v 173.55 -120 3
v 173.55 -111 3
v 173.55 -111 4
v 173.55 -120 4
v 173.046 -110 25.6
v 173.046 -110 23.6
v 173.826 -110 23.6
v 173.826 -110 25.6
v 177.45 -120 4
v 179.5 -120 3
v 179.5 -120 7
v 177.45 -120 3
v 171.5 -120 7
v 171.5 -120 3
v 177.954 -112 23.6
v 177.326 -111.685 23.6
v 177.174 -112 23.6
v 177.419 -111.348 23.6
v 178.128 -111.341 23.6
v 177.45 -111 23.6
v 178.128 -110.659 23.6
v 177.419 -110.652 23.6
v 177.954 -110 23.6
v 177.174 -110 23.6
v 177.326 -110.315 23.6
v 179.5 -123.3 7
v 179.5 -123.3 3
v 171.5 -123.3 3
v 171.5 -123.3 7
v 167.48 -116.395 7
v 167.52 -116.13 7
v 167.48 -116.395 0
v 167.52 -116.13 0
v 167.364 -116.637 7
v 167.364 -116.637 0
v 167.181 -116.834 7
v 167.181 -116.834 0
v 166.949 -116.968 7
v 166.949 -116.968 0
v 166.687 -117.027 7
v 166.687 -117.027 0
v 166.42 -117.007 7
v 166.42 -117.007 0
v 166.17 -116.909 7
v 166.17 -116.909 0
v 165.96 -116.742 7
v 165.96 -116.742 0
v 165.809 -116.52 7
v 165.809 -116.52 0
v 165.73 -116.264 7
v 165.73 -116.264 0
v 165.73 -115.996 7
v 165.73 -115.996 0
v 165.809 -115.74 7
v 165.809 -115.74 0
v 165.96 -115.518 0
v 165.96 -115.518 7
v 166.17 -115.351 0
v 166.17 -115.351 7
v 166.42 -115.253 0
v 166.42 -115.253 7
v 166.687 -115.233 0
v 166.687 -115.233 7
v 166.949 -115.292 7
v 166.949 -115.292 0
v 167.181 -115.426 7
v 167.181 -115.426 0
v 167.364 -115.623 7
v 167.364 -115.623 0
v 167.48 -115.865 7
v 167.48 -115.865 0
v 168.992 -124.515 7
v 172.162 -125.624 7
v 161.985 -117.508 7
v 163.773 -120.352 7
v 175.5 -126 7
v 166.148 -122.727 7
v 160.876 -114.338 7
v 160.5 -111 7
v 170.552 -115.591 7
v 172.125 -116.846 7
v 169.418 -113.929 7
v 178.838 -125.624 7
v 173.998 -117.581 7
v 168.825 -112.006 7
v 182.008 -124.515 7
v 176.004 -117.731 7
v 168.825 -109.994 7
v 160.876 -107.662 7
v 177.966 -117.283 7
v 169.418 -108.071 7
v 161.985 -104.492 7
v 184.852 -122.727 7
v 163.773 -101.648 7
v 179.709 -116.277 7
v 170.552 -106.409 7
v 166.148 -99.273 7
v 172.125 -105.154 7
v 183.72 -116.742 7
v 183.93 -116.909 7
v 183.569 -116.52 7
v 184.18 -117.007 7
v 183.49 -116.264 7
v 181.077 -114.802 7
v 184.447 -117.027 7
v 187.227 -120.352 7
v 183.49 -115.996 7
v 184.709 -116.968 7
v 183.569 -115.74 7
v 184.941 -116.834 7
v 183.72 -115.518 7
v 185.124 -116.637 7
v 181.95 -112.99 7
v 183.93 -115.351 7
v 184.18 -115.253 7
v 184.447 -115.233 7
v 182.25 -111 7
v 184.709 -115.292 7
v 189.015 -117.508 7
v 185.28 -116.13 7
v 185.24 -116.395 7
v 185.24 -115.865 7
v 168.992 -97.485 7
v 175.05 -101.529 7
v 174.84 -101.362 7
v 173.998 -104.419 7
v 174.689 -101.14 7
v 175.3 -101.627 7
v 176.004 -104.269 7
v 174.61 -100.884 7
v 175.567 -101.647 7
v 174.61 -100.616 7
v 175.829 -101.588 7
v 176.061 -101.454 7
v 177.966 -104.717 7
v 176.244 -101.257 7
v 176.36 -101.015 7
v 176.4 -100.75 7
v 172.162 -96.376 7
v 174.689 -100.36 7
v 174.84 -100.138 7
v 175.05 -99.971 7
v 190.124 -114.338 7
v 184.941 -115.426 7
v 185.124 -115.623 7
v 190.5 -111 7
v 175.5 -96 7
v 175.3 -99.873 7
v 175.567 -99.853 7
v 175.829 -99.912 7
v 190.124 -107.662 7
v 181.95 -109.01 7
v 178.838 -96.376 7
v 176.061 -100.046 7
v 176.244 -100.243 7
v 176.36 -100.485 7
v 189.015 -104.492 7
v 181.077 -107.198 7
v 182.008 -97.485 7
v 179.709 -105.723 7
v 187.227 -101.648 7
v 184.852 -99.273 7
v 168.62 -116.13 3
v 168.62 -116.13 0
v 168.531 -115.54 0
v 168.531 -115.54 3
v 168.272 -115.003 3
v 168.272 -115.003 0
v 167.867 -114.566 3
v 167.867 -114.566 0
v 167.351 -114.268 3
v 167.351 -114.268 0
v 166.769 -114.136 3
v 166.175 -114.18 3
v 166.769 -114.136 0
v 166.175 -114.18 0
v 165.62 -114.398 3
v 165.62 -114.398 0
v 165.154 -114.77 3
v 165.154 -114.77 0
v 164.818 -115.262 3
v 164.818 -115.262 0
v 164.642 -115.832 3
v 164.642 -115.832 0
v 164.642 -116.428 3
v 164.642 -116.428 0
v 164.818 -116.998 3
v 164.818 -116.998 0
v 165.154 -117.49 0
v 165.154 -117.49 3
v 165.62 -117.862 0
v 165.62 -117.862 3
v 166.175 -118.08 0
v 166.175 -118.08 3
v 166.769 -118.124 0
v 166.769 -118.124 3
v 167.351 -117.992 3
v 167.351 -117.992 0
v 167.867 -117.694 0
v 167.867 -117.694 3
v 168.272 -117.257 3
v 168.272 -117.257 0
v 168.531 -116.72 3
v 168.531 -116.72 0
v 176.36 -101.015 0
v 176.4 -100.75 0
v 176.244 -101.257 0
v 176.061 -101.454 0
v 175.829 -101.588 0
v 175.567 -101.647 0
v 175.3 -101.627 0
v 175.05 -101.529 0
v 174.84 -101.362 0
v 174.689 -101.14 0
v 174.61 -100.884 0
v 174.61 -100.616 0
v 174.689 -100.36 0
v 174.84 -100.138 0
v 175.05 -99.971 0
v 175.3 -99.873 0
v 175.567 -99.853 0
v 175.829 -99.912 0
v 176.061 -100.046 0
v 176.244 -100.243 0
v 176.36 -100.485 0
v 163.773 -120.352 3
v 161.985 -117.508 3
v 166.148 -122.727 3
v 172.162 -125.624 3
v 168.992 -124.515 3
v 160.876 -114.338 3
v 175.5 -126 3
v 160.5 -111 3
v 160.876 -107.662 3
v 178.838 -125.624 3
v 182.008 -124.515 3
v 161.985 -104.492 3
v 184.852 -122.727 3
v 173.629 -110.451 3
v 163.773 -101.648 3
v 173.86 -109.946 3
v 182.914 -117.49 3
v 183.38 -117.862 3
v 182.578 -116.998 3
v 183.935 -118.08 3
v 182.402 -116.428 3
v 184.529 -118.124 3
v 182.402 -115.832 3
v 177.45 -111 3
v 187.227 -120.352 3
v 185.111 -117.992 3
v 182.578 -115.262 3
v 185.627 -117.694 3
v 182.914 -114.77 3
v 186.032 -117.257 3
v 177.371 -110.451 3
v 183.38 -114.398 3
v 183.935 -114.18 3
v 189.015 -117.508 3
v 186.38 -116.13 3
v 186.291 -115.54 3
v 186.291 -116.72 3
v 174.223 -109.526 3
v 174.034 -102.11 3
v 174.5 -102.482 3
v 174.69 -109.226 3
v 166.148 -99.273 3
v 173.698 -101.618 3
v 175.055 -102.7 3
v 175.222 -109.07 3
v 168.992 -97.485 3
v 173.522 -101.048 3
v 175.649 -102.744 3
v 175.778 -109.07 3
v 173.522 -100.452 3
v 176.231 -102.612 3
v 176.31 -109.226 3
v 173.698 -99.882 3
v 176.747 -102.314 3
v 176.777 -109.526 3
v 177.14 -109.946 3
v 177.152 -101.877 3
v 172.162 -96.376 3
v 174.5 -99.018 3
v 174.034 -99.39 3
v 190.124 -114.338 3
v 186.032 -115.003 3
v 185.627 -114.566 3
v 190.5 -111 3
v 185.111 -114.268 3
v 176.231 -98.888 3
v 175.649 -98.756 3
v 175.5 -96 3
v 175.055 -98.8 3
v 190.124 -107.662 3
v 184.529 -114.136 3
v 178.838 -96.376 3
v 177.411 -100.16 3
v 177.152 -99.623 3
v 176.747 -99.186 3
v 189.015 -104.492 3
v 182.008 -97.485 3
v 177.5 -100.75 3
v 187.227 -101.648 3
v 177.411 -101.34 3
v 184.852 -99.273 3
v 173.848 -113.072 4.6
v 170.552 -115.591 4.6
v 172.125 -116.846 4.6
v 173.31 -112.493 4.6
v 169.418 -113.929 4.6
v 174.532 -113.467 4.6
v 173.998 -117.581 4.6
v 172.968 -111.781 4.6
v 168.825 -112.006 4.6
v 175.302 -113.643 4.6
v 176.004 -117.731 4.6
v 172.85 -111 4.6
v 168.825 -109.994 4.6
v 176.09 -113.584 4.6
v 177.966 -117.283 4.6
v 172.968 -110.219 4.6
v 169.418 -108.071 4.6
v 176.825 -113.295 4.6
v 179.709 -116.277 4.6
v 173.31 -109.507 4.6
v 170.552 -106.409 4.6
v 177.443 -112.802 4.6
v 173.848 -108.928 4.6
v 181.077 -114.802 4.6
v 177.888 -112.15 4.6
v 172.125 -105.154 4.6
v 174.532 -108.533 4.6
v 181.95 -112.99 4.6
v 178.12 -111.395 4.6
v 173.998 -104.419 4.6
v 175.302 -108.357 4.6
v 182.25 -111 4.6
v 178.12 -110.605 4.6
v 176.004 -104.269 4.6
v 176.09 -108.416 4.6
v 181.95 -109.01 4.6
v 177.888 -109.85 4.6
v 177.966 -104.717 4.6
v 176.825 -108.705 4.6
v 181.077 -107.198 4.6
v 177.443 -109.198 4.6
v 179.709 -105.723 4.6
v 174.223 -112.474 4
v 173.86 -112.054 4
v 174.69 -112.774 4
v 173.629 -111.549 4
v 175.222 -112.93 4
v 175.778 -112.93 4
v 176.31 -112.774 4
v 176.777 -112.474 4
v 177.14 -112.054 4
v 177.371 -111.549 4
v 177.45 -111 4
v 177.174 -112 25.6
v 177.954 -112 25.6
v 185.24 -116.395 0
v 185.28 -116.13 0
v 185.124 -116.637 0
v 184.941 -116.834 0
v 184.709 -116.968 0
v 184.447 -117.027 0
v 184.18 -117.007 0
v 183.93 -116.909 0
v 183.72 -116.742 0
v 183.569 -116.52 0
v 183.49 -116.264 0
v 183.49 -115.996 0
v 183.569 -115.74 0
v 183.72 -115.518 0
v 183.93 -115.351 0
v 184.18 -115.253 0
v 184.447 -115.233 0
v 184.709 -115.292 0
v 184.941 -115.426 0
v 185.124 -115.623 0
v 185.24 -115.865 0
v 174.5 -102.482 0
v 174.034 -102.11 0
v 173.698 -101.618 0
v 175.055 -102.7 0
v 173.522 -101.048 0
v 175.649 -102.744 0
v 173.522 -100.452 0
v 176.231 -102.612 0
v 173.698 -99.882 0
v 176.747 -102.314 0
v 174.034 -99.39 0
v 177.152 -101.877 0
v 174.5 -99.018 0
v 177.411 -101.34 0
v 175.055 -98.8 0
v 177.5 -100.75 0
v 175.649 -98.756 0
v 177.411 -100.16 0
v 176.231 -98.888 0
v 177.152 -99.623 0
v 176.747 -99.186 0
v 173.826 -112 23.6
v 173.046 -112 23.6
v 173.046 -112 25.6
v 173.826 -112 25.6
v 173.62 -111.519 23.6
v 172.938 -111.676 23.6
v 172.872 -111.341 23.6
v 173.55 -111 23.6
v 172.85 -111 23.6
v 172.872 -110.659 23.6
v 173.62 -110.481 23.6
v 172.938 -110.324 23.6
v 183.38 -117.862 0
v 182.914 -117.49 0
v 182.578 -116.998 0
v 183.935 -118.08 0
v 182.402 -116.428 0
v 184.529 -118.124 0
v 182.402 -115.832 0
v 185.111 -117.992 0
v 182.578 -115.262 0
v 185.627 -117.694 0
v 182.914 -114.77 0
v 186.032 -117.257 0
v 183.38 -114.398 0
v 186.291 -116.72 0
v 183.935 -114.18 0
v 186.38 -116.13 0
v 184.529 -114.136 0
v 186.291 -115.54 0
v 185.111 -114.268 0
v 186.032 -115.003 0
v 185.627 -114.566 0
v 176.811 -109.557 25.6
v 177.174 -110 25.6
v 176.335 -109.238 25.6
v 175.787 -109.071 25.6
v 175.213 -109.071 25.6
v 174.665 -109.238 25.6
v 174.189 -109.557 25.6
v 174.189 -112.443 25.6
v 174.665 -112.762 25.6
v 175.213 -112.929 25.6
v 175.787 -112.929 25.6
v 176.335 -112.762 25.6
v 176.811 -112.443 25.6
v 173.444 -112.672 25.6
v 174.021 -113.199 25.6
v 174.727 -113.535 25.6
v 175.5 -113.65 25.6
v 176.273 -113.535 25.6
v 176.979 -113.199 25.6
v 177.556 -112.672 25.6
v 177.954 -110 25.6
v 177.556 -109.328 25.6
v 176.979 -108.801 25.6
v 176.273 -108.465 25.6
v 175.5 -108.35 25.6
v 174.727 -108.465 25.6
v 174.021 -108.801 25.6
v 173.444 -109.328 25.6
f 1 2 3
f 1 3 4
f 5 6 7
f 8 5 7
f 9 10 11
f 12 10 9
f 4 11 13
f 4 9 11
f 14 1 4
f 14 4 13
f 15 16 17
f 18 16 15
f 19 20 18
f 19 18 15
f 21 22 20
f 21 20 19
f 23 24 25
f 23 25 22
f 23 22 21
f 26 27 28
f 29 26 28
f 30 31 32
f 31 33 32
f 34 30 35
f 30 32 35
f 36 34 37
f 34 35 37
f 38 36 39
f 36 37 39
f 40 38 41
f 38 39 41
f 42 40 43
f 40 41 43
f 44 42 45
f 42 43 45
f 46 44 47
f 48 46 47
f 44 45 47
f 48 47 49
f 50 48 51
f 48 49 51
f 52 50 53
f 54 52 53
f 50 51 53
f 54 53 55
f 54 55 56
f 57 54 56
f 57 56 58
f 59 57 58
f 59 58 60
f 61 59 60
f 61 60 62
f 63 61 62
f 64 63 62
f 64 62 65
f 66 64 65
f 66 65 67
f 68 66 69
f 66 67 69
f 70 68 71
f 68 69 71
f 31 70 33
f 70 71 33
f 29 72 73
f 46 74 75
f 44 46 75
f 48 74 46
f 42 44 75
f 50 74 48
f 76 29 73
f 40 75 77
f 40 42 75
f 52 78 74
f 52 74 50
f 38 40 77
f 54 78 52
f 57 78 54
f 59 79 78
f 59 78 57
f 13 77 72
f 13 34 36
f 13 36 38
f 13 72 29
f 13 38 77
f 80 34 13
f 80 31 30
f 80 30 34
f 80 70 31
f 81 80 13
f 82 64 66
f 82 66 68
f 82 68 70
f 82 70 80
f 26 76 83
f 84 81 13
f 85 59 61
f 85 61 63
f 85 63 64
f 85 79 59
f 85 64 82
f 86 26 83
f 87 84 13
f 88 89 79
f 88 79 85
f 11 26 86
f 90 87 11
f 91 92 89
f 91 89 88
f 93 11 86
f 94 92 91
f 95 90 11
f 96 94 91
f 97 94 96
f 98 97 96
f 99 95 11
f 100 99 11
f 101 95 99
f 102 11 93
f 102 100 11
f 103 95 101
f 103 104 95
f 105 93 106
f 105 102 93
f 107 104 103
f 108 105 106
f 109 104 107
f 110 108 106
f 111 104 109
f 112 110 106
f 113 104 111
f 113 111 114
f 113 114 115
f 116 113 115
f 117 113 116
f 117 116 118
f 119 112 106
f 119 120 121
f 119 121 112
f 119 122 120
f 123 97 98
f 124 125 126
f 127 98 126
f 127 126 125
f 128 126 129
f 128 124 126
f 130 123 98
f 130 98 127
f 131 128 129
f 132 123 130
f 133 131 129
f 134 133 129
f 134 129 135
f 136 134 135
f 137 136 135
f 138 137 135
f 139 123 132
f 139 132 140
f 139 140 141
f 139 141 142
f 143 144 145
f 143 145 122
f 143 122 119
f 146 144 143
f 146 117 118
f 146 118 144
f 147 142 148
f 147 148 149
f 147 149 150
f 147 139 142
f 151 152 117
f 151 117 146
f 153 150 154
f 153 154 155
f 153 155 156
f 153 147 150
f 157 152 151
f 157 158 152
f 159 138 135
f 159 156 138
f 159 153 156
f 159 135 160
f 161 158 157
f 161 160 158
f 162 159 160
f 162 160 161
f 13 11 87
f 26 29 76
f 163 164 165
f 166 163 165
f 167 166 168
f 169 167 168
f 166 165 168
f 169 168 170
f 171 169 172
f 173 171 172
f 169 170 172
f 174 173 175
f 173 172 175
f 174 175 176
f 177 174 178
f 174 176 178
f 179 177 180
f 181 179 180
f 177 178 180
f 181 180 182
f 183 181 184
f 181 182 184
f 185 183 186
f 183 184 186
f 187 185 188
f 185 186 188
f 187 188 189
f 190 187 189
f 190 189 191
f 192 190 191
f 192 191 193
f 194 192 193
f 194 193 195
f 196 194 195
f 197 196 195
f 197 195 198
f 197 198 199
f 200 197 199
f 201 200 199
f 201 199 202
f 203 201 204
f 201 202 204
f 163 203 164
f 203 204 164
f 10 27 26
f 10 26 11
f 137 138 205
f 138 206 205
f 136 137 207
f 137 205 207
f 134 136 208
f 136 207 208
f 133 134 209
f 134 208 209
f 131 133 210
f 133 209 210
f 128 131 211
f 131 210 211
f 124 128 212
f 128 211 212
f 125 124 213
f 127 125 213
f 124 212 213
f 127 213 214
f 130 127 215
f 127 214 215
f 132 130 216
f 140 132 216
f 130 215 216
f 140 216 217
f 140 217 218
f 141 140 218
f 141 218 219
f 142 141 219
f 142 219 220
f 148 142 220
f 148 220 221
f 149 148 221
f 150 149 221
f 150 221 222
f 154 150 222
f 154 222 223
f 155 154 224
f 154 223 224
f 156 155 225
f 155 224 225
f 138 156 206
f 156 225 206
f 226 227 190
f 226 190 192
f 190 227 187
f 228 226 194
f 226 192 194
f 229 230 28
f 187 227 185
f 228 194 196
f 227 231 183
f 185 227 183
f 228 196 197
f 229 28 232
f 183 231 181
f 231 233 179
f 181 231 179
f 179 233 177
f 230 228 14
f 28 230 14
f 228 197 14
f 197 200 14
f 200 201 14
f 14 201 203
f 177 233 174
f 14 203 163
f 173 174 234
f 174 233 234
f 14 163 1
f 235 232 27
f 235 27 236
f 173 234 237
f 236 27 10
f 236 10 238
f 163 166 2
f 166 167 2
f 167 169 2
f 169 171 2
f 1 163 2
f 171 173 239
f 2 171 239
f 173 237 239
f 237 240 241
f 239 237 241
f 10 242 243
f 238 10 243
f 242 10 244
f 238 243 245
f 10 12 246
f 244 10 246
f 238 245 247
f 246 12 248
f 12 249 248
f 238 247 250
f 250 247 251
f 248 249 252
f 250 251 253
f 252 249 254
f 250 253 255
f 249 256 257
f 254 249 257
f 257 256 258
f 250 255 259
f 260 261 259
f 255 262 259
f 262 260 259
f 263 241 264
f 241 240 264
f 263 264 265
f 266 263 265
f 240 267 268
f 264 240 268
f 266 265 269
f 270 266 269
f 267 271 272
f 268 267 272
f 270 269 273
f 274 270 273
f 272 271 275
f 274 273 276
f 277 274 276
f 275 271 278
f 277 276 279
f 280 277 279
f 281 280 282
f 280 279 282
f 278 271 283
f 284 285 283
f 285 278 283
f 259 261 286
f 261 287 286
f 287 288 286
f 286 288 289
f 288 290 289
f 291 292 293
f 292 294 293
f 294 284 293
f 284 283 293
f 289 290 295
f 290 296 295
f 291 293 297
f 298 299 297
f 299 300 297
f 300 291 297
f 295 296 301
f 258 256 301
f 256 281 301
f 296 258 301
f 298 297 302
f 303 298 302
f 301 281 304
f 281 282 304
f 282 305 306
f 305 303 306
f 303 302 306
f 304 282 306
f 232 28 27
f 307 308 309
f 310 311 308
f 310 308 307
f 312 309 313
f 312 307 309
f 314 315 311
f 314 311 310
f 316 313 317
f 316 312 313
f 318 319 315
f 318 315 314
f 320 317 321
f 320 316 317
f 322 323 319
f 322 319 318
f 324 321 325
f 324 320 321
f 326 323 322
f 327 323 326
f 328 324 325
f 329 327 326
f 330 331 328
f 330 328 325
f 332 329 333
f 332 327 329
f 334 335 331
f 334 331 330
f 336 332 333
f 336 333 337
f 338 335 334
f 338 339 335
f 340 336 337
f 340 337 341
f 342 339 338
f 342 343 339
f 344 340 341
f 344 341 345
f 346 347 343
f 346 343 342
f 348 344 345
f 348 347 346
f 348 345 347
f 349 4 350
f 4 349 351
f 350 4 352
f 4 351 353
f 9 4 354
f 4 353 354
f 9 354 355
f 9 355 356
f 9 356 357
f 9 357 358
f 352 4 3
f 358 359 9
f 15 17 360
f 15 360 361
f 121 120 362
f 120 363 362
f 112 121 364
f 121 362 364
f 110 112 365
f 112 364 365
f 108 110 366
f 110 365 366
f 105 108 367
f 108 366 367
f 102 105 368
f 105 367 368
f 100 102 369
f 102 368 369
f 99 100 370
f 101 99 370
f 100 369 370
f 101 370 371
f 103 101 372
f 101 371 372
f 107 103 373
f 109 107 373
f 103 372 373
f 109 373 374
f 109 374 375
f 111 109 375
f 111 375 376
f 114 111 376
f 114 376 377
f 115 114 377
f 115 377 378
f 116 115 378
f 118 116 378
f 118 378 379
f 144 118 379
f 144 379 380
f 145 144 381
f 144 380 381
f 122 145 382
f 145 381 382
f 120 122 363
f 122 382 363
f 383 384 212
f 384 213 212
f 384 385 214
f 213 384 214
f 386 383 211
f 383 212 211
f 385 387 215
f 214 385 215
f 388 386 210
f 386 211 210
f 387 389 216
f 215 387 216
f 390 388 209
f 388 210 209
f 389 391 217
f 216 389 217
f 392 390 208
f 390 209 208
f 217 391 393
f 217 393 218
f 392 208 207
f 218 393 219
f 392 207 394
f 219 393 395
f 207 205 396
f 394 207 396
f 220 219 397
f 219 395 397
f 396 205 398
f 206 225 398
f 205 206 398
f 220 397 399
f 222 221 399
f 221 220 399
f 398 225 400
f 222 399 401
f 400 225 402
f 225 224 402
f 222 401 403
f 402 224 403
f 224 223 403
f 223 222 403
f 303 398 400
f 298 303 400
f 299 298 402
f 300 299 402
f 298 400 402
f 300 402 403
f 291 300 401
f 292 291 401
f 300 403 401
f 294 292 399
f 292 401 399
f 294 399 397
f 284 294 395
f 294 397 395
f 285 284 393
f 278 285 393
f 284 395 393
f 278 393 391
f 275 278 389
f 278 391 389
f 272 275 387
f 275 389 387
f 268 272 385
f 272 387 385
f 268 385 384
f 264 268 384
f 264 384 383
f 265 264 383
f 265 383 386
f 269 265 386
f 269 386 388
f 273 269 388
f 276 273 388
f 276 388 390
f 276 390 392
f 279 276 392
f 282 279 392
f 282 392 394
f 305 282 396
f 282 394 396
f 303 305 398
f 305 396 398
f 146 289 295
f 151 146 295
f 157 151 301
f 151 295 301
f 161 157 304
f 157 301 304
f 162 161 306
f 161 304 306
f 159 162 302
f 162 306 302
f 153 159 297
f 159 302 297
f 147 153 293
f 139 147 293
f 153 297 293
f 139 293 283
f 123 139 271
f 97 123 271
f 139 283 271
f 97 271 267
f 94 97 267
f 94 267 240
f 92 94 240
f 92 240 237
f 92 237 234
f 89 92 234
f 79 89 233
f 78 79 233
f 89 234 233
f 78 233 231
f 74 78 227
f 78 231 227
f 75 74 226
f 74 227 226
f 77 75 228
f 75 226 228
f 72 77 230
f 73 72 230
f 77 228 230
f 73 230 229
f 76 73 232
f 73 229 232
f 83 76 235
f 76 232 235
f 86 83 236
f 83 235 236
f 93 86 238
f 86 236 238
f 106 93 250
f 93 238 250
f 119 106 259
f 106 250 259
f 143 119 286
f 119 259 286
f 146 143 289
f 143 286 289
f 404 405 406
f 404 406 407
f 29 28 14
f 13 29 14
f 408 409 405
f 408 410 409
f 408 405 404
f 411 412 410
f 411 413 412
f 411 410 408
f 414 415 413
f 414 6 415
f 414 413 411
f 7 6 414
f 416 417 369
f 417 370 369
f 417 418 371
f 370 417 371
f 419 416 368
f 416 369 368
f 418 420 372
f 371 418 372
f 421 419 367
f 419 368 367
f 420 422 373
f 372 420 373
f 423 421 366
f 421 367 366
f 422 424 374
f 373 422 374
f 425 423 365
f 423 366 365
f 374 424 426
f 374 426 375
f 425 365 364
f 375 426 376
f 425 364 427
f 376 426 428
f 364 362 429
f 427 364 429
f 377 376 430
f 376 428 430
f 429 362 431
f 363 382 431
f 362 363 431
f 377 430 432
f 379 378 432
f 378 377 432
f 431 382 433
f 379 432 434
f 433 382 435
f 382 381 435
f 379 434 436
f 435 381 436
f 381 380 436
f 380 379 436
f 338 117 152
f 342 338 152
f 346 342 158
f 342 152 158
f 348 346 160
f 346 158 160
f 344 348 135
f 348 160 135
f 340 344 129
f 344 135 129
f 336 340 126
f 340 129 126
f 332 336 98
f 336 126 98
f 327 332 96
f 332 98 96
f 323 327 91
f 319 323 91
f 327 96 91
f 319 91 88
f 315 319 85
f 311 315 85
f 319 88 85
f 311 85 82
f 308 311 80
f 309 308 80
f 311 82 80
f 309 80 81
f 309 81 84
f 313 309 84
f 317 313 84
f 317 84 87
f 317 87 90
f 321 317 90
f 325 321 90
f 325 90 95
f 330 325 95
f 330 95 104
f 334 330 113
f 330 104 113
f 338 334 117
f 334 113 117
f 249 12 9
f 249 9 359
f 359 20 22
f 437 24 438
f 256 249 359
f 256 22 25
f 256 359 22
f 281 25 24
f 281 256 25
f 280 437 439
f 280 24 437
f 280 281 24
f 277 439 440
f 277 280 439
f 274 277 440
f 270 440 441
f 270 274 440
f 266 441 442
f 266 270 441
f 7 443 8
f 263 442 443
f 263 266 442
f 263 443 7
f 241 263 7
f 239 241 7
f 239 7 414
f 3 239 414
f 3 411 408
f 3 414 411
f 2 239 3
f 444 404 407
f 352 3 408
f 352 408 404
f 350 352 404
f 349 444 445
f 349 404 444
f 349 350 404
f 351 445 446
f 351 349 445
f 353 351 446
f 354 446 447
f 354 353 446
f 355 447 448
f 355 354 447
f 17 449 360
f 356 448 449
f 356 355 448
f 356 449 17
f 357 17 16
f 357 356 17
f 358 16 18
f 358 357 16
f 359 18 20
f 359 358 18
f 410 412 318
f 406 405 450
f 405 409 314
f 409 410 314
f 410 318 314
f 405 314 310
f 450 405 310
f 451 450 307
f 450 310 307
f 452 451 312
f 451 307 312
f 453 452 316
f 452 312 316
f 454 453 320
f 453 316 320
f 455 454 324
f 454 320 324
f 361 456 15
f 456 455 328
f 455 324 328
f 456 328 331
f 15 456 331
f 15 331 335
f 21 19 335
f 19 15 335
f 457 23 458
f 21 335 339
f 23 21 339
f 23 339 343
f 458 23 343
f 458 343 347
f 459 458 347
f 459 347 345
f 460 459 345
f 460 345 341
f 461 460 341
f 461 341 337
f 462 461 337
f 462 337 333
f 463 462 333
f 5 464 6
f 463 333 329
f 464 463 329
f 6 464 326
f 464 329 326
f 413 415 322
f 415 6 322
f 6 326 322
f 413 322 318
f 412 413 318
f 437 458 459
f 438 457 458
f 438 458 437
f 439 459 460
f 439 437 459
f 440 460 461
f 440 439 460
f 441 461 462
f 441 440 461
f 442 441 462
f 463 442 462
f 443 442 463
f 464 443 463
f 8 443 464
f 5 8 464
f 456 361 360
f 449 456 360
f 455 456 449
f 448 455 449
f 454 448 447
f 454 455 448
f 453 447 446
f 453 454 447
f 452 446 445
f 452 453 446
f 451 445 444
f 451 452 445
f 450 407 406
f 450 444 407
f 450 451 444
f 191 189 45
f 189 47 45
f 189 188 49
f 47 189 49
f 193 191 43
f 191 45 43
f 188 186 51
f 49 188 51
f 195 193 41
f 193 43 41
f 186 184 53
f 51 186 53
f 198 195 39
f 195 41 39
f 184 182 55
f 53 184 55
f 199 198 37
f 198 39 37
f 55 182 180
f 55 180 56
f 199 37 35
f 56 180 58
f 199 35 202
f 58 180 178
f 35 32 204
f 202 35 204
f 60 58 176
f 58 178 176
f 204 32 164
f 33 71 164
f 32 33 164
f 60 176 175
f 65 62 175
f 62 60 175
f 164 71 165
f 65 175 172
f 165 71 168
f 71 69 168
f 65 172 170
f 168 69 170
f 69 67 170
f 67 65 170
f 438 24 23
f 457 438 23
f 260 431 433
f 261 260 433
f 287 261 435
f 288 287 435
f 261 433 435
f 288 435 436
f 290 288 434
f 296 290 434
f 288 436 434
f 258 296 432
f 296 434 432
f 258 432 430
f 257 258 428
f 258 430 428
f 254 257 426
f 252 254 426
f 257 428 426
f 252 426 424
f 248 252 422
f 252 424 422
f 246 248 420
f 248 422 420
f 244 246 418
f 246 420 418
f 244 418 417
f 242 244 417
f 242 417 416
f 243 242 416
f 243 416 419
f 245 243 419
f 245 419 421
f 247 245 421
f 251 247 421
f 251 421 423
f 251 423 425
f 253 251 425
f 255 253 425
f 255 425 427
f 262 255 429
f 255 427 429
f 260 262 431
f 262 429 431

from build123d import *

# Parameters (mm, degrees)
SKETCH1_R             = 2
SKETCH1_R_2           = 0.9
BOSS_EXTRUDE1_DEPTH   = 3
BOSS_EXTRUDE1_2_DEPTH = 3
BOSS_EXTRUDE1_3_DEPTH = 3
SKETCH2_R             = 15
SKETCH2_R_2           = 1.95
BOSS_EXTRUDE2_DEPTH   = 4
SKETCH4_W             = 8
SKETCH4_H             = 3.3
CUT_EXTRUDE2_DEPTH    = 229.434345053
SKETCH5_R             = 6.75
CUT_EXTRUDE3_DEPTH    = 2.4
CUT_EXTRUDE5_DEPTH    = 1
SKETCH8_R             = 2.65
SKETCH8_R_2           = 1.95
BOSS_EXTRUDE3_DEPTH   = 21
SKETCH10_R            = 0.9
CUT_EXTRUDE6_DEPTH    = 230.514727196
SKETCH11_W            = 7
SKETCH11_H            = 2
CUT_EXTRUDE7_DEPTH    = 2


with BuildPart() as part:
    # Sketch1 → Boss-Extrude1 (new body)
    with BuildSketch(Plane.XY):
        with Locations((166.62, -116.13)):
            Circle(SKETCH1_R)
        with Locations((166.62, -116.13)):
            Circle(SKETCH1_R_2, mode=Mode.SUBTRACT)
    extrude(amount=BOSS_EXTRUDE1_DEPTH)



with BuildPart() as body_2:
    # Sketch1 → Boss-Extrude1 2 (new body)
    with BuildSketch(Plane.XY):
        with Locations((175.5, -100.75)):
            Circle(SKETCH1_R)
        with Locations((175.5, -100.75)):
            Circle(SKETCH1_R_2, mode=Mode.SUBTRACT)
    extrude(amount=BOSS_EXTRUDE1_2_DEPTH)


with BuildPart() as body_3:
    # Sketch1 → Boss-Extrude1 3 (new body)
    with BuildSketch(Plane.XY):
        with Locations((184.38, -116.13)):
            Circle(SKETCH1_R)
        with Locations((184.38, -116.13)):
            Circle(SKETCH1_R_2, mode=Mode.SUBTRACT)
    extrude(amount=BOSS_EXTRUDE1_3_DEPTH)


with BuildPart() as part_1:
    add(part.part)

    add(body_2.part)  # Boss-Extrude2 merges body 2

    add(body_3.part)  # Boss-Extrude2 merges body 3
    # Sketch2 → Boss-Extrude2 (add)
    with BuildSketch(Plane.XY.offset(3)):
        with Locations((175.5, -111)):
            Circle(SKETCH2_R)
        with Locations((175.5, -111)):
            Circle(SKETCH2_R_2, mode=Mode.SUBTRACT)
    extrude(amount=BOSS_EXTRUDE2_DEPTH)

    # Sketch4 → Cut-Extrude2 (cut, through all)
    with BuildSketch(Plane(origin=(0, 0, 3), x_dir=(-1, 0, 0), z_dir=(0, 0, -1))):
        with Locations((-175.5, -121.65)):
            Rectangle(SKETCH4_W, SKETCH4_H)
    extrude(amount=-CUT_EXTRUDE2_DEPTH, mode=Mode.SUBTRACT)

    # Sketch5 → Cut-Extrude3 (cut)
    with BuildSketch(Plane.XY.offset(7)):
        with Locations((175.5, -111)):
            Circle(SKETCH5_R)
    extrude(amount=-CUT_EXTRUDE3_DEPTH, mode=Mode.SUBTRACT)

    # Sketch6 → Cut-Extrude5 (cut)
    with BuildSketch(Plane(origin=(0, 0, 3), x_dir=(-1, 0, 0), z_dir=(0, 0, -1))):
        with BuildLine():
            Line((-173.55, -111), (-173.55, -120))
            ThreePointArc((-173.55, -120), (-175.5, -121.95), (-177.45, -120))
            Line((-177.45, -120), (-177.45, -111))
            ThreePointArc((-177.45, -111), (-175.5, -109.05), (-173.55, -111))
        make_face()
    extrude(amount=-CUT_EXTRUDE5_DEPTH, mode=Mode.SUBTRACT)

    # Sketch8 → Boss-Extrude3 (add)
    with BuildSketch(Plane.XY.offset(4.6)):
        with Locations(Location((175.5, -111, 0), (0, 0, 180))):
            Circle(SKETCH8_R)
        with Locations((175.5, -111)):
            Circle(SKETCH8_R_2, mode=Mode.SUBTRACT)
    extrude(amount=BOSS_EXTRUDE3_DEPTH)

    # Sketch10 → Cut-Extrude6 (cut, through all)
    with BuildSketch(Plane(origin=(0, 0, 3), x_dir=(-1, 0, 0), z_dir=(0, 0, -1))):
        with Locations(Location((-175.5, -100.75, 0), (0, 0, 180))):
            Circle(SKETCH10_R)
        with Locations(Location((-184.38, -116.13, 0), (0, 0, 180))):
            Circle(SKETCH10_R)
        with Locations(Location((-166.62, -116.13, 0), (0, 0, 180))):
            Circle(SKETCH10_R)
    extrude(amount=-CUT_EXTRUDE6_DEPTH, mode=Mode.SUBTRACT)

    # Sketch11 → Cut-Extrude7 (cut)
    with BuildSketch(Plane.XY.offset(25.6)):
        with Locations((175.5, -111)):
            Rectangle(SKETCH11_W, SKETCH11_H)
    extrude(amount=-CUT_EXTRUDE7_DEPTH, mode=Mode.SUBTRACT)


solid = part_1.part
